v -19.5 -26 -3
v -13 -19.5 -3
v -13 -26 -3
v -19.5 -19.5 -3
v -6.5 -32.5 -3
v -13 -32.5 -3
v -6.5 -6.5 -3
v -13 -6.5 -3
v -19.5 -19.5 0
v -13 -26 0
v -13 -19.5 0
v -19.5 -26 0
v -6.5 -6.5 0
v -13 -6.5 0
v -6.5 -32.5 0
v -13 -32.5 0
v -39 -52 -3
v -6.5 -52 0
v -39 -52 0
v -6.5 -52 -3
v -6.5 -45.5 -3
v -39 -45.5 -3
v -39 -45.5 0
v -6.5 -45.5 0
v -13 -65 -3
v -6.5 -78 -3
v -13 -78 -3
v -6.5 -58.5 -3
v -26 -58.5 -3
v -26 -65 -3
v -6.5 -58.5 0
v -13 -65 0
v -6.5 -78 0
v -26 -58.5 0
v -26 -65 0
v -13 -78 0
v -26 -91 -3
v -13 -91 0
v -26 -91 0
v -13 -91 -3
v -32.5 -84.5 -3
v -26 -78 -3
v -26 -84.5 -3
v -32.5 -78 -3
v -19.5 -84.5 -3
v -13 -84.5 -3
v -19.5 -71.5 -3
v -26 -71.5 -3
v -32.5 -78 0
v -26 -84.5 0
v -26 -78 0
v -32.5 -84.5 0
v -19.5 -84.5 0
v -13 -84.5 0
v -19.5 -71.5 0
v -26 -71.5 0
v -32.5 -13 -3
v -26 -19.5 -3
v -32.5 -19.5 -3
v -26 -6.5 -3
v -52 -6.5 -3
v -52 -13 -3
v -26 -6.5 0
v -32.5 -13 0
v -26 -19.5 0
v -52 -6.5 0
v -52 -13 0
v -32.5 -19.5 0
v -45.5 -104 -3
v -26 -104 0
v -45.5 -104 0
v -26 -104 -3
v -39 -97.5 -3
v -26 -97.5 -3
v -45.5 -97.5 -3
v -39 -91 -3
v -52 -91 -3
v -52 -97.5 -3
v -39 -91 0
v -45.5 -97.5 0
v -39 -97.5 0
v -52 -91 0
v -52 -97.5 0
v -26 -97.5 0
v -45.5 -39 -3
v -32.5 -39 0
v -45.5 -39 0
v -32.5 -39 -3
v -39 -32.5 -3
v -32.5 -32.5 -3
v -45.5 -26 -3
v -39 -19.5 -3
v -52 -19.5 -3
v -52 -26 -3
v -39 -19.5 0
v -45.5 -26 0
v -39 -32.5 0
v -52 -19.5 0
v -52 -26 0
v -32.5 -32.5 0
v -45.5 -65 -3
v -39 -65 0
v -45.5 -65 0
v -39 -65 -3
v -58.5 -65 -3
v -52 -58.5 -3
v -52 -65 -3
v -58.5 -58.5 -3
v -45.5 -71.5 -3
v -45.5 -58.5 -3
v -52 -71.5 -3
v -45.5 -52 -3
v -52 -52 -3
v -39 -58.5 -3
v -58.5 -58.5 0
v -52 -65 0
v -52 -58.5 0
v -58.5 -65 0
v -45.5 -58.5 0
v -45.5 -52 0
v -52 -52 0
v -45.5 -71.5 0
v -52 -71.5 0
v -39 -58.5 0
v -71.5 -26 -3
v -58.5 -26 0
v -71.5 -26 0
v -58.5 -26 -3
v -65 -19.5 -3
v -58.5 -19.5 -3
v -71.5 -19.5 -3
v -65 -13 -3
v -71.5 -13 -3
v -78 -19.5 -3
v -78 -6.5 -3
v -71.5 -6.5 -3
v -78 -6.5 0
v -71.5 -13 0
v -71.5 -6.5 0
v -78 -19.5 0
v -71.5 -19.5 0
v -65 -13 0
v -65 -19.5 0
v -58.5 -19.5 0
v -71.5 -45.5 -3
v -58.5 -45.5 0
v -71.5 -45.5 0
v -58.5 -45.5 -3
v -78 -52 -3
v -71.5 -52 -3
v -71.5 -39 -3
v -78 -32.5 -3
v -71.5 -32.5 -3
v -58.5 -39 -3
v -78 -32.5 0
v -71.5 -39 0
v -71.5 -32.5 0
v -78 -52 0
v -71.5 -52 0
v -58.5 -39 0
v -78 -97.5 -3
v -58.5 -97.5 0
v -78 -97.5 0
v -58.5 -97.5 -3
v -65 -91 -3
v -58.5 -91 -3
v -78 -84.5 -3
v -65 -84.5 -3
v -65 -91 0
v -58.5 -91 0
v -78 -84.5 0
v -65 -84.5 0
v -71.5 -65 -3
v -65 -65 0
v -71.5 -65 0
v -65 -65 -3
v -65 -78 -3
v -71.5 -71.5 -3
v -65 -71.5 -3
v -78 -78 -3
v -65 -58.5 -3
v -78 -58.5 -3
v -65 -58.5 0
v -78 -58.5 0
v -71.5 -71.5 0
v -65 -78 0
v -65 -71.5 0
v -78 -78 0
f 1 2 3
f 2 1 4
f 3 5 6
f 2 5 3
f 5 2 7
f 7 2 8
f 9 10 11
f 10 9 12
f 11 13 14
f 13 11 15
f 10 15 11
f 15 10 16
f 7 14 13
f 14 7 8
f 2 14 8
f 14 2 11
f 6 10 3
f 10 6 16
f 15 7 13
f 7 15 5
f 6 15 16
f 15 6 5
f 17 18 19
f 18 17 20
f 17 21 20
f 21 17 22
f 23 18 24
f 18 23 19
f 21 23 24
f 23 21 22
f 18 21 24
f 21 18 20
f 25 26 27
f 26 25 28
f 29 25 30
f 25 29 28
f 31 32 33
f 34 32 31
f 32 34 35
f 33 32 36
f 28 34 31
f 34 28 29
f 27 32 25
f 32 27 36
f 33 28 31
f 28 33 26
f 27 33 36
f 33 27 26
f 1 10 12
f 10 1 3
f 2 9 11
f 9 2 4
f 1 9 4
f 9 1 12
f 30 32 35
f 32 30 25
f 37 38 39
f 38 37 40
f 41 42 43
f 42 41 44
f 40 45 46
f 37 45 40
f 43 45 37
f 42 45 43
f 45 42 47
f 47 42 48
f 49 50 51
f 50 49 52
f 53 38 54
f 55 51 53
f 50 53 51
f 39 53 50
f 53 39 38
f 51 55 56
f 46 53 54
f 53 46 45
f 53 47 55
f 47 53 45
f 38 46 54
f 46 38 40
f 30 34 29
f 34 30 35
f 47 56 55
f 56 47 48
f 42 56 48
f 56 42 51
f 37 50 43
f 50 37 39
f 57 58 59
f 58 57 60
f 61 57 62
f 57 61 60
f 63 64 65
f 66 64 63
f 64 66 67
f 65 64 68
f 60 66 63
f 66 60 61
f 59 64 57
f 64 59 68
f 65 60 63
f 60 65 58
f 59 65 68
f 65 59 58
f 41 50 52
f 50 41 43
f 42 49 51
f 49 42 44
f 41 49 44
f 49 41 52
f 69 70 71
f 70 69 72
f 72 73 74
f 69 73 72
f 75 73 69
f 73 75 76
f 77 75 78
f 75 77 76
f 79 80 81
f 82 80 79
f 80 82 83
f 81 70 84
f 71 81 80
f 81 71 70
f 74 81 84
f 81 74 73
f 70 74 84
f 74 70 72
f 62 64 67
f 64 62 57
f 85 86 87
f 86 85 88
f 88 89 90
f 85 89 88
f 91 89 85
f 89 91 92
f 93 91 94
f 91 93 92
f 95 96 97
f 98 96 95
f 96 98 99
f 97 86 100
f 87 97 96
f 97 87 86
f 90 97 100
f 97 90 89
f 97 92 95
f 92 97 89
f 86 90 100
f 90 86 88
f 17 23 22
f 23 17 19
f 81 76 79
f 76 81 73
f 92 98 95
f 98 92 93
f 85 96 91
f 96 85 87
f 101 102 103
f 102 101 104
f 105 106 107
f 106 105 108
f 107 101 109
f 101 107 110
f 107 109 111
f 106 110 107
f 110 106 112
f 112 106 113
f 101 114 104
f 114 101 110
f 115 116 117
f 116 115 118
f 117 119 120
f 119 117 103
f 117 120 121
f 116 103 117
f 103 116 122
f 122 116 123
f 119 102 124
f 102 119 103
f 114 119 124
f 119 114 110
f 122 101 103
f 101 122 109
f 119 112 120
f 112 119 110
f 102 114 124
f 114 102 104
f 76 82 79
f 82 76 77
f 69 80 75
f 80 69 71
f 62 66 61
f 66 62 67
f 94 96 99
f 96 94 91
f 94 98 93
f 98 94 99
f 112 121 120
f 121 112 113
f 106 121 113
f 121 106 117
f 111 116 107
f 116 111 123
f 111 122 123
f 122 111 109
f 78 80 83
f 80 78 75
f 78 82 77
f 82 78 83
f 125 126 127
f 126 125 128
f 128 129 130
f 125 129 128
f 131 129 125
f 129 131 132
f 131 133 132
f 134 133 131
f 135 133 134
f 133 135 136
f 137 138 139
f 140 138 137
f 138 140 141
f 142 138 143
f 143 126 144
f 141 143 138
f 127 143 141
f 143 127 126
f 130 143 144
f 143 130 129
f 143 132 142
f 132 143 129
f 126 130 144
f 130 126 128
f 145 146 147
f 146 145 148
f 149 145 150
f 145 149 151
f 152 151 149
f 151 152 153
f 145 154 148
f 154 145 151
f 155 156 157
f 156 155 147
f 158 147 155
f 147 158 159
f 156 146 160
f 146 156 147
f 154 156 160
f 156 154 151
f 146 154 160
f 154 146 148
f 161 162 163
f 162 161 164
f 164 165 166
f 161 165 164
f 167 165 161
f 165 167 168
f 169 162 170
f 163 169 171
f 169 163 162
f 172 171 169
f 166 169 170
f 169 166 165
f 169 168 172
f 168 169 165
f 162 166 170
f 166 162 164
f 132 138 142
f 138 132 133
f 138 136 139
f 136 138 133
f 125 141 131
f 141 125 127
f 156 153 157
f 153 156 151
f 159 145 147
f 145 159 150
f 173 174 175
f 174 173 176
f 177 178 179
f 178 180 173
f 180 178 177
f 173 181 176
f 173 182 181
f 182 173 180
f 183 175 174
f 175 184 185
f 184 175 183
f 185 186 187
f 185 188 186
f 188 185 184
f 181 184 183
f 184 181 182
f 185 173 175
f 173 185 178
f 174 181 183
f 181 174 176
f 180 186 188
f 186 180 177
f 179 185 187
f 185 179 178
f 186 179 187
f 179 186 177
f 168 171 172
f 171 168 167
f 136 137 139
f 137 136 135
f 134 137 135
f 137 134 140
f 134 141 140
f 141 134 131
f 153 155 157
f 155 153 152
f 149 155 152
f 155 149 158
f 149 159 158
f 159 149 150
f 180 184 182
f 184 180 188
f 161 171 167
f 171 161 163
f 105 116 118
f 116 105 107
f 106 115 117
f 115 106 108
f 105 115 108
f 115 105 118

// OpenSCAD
/*
PENTOMINO BLOCKS GENERATOR
==========================
(C) 2017 by Pascal Bauermeister.

(This is a part of the project "Pentomino Belt Buckle", focused on the
Pentomino pieces. It can however be used standalone. The other parts, not in this
file, include: frame, belt clip.)

This OpenSCAD script generates Pentomino blocks, with tabs and cavities to
allow them to hold together.

Being completely parametric allows individual control such as:
- size and thickness,
- tolerances (important for 3D printing), and also
- creating any kind of pieces, including 2D Polyminos of N cells for any N.

This is freeware. Enjoy and modify freely. You may kindly mention this project.
*/

IS_INV = 1;

$fn = 24; // 24: high quality; 8: draft
//$fn = 8;
$fn = 16;

// BASE ETCHING
// this etches the first layer, to compensate for being wider due to being squished down
BASE_HEIGHT = 0.3;
BASE_TOLERANCE = 0.3;

// BLOCK
BLOCK_TOLERANCE = 0.15; // in mm
BLOCK_TOLERANCE = 0.00; // in mm

BLOCK_SIDE = 6.5;       // in mm
BLOCK_HEIGHT = 3;     // in mm

// GRIP
GRIP_TOLERANCE_H = 0.6; // in mm -- horizontal tolerance around grips; 
                        // more means smaller grip
GRIP_TOLERANCE_V = 0.3; // in mm -- vertical tolerance around grips;
                        // affects cavity height
GRIP_RADIUS = BLOCK_SIDE/4 - GRIP_TOLERANCE_H; // in mm
GRIP_HEIGHT = 1;      // in mm
GRIP_RADIUS2 = BLOCK_TOLERANCE;
GRIP_V_OFFSET = IS_INV ? -0.5 : 0.5;

// CAVITY
CAVITY_MARGIN = 0.4; // in mm -- For cavity to not take whole half-side and leave margin on the corner
CAVITY_RADIUS = BLOCK_SIDE/4 - CAVITY_MARGIN; // in mm
CAVITY_HEIGHT = GRIP_HEIGHT + GRIP_TOLERANCE_V; // in mm
CAVITY_RADIUS2 = BLOCK_TOLERANCE;
CAVITY_DISP = BLOCK_TOLERANCE * 2;

CAVITY_RADIUS3 = 0.7;

// MISC
ATOM = 0.0001; // a tiny value just to produce some offsets, making the 
               // results nicer in preview mode by cancelling effects of
               // boolean operations, but meant to not affect the end result
               // noticeably
_ = 0;

///////////////////////////////////////////////////////////////////////////////
// Bitmap defining the Pentomino shapes
GRID = [
    [_, _, _, _, _, _, _, _, _, _, _, _, _, _, _, _, _],
    [_, 1, 1, 1, 1, _, _, 1, _, 1, 1, 1, _, _, _, _, _],
    [_, _, _, 1, _, _, _, 1, _, 1, _, _, _, 1, _, _, _],
    [_, _, _, _, _, _, _, 1, _, 1, _, 1, 1, 1, _, _, _], 
    [_, 1, 1, _, _, _, _, 1, _, _, _, _, 1, _, _, 1, _],
    [_, 1, _, _, _, 1, _, 1, _, _, _, _, _, _, _, 1, _],
    [_, 1, _, 1, 1, 1, _, _, _, 1, _, _, _, _, 1, 1, _],
    [_, 1, _, 1, _, _, _, _, 1, 1, 1, _, _, _, 1, _, _],
    [_, _, _, _, _, _, _, _, _, 1, _, _, _, _, _, _, _],
    [_, _, _, 1, _, _, 1, _, _, _, _, _, _, _, 1, _, _],
    [_, _, 1, 1, _, _, 1, _, _, 1, _, 1, _, 1, 1, _, _],
    [_, 1, 1, _, _, 1, 1, 1, _, 1, 1, 1, _, 1, 1, _, _],
    [_, _, _, _, _, _, _, _, _, _, _, _, _, _, _, _, _],

//    // Chiral copies
//    [_, _, _, _, _, _, _, _, _, _, _, _, _, _, _, _, _],
//    [_, 1, 1, 1, 1, _, 1, _, _, _, 1, 1, 1, 1, _, _, _],
//    [_, _, 1, _, _, _, 1, 1, 1, _, 1, _, _, _, _, _, _],
//    [_, _, _, _, _, _, _, 1, _, _, _, _, _, 1, _, _, _],
//    [_, _, _, 1, 1, _, _, _, _, _, 1, 1, _, 1, 1, 1, _],
//    [_, 1, 1, 1, _, _, _, _, _, 1, 1, 1, _, _, _, 1, _],
    [_, _, _, _, _, _, _, _, _, _, _, _, _, _, _, _, _],
];


GRID_ = [
    [_, _, _, _, _, _, _, _, _, _, _, _, _, _, _, _, _],
    [_, _, _, _, _, _, _, _, _, 1, 1, 1, _, _, _, _, _],
    [_, _, _, _, _, _, _, _, _, 1, _, _, _, 1, _, _, _],
    [_, _, _, _, _, _, _, _, _, 1, _, 1, 1, 1, _, _, _], 
    [_, 1, 1, _, _, _, _, _, _, _, _, _, 1, _, _, 1, _],
    [_, 1, _, _, _, 1, _, _, _, _, _, _, _, _, _, 1, _],
    [_, 1, _, 1, 1, 1, _, _, _, 1, _, _, _, _, 1, 1, _],
    [_, 1, _, 1, _, _, _, _, 1, 1, 1, _, _, _, 1, _, _],
    [_, _, _, _, _, _, _, _, _, 1, _, _, _, _, _, _, _],
    [_, _, _, 1, _, _, 1, _, _, _, _, _, _, _, 1, _, _],
    [_, _, 1, 1, _, _, 1, _, _, 1, _, 1, _, 1, 1, _, _],
    [_, 1, 1, _, _, 1, 1, 1, _, 1, 1, 1, _, 1, 1, _, _],
    [_, _, _, _, _, _, _, _, _, _, _, _, _, _, _, _, _],

];

// Rename as GRID to have a single block, for tests
GRID_ = [
    [_, _, _, _, _, _, _],
    [_, _, _, _, 1, _, _],
    [_, 1, 1, 1, 1, _, _],
    [_, _, _, _, _, _, _],
    [_, _, _, _, _, _, _],
];

///////////////////////////////////////////////////////////////////////////////
// Side-level primitives

/* Generate a grip for one give side (to be added) */
module make_grip_side(x, y, side) {
    convex = (side=="n") ? GRID[y+1][x-1] || GRID[y+1][x+1] :
             (side=="s") ? GRID[y-1][x-1] || GRID[y-1][x+1] :
             (side=="e") ? GRID[y+1][x+1] || GRID[y-1][x+1] :
           /*(side=="w")*/ GRID[y+1][x-1] || GRID[y-1][x-1];
    if (!convex) {
        center = (side=="n") ? [BLOCK_SIDE*.75, BLOCK_SIDE -BLOCK_TOLERANCE*2, 0] :
                 (side=="s") ? [BLOCK_SIDE*.25,             BLOCK_TOLERANCE*2, 0] :
                 (side=="e") ? [BLOCK_SIDE -BLOCK_TOLERANCE*2, BLOCK_SIDE*.25, 0] :
               /*(side=="w")*/ [            BLOCK_TOLERANCE*2, BLOCK_SIDE*.75, 0] ;
        dh = (BLOCK_HEIGHT - GRIP_HEIGHT*2) / 2 - GRIP_V_OFFSET;

        color("yellow")
        translate([0, 0, dh])
        translate(center)
        cylinder(h=GRIP_HEIGHT, r2=GRIP_RADIUS, r1=GRIP_RADIUS2);

        color("yellow")
        translate([0, 0, GRIP_HEIGHT+dh])
        translate(center)
        cylinder(h=GRIP_HEIGHT, r1=GRIP_RADIUS, r2=GRIP_RADIUS2);
    }
}

/* Generate a cavity for one give side (to be substracted) */
module make_cavity_side(x, y, side) {
    // cavity for grip of neighbour piece
    center = (side=="n") ? [BLOCK_SIDE*.25, BLOCK_SIDE -CAVITY_DISP, 0] :
             (side=="s") ? [BLOCK_SIDE*.75,            +CAVITY_DISP, 0] :
             (side=="e") ? [BLOCK_SIDE -CAVITY_DISP, BLOCK_SIDE*.75, 0] :
           /*(side=="w")*/ [           +CAVITY_DISP, BLOCK_SIDE*.25, 0];    
    dh = (BLOCK_HEIGHT - CAVITY_HEIGHT*2) / 2 - GRIP_V_OFFSET;

    color("orange")
    translate([0, 0, dh])
    translate(center)
    cylinder(h=CAVITY_HEIGHT, r2=CAVITY_RADIUS, r1=CAVITY_RADIUS2);

    color("orange")
    translate([0, 0, CAVITY_HEIGHT+dh])
    translate(center)
    cylinder(h=CAVITY_HEIGHT, r1=CAVITY_RADIUS, r2=CAVITY_RADIUS2);

}

/* Generate an etching for one give side (to be substracted) */
module make_etch_side(x, y, side) {
    center = (side=="n") ? [BLOCK_SIDE/2,   BLOCK_SIDE] :
             (side=="s") ? [BLOCK_SIDE/2,            0] :
             (side=="e") ? [  BLOCK_SIDE, BLOCK_SIDE/2] :
           /*(side=="w")*/ [           0, BLOCK_SIDE/2];

    // main etiching
    qsize = (side=="n") ? [BLOCK_SIDE + BLOCK_TOLERANCE*2, BLOCK_TOLERANCE*2] :
            (side=="s") ? [BLOCK_SIDE + BLOCK_TOLERANCE*2, BLOCK_TOLERANCE*2] :
            (side=="e") ? [BLOCK_TOLERANCE*2, BLOCK_SIDE + BLOCK_TOLERANCE*2] :
          /*(side=="w")*/ [BLOCK_TOLERANCE*2, BLOCK_SIDE + BLOCK_TOLERANCE*2];
    tx = center[0] - qsize[0]/2;
    ty = center[1] - qsize[1]/2;

    color("green")
    translate([tx, ty, -ATOM])
    cube([qsize[0], qsize[1], BLOCK_HEIGHT + ATOM*2]);
    
    // base etiching
    qsize2 = (side=="n") ? [BLOCK_SIDE + BLOCK_TOLERANCE*2 + BASE_TOLERANCE*2, BLOCK_TOLERANCE*2 + BASE_TOLERANCE*2] :
             (side=="s") ? [BLOCK_SIDE + BLOCK_TOLERANCE*2 + BASE_TOLERANCE*2, BLOCK_TOLERANCE*2 + BASE_TOLERANCE*2] :
             (side=="e") ? [BLOCK_TOLERANCE*2 + BASE_TOLERANCE*2, BLOCK_SIDE + BLOCK_TOLERANCE*2 + BASE_TOLERANCE*2] :
          /*(side=="w")*/ [BLOCK_TOLERANCE*2 + BASE_TOLERANCE*2, BLOCK_SIDE + BLOCK_TOLERANCE*2 + BASE_TOLERANCE*2];
    tx2 = center[0] - qsize2[0]/2;
    ty2 = center[1] - qsize2[1]/2;
    color("black")
    translate([tx2, ty2, -ATOM])
    cube([qsize2[0], qsize2[1], BASE_HEIGHT + ATOM*2]);    
}

///////////////////////////////////////////////////////////////////////////////
// Block-level primitives

/* Generate a given grid block */
module make_block(x, y) {
    if (GRID[y][x]) {
        translate([x*BLOCK_SIDE, y*BLOCK_SIDE, 0])
        cube([BLOCK_SIDE, BLOCK_SIDE, BLOCK_HEIGHT]);
    }
}

/* Generate etching for a given grid block (to be substracted) */
module make_etch(x, y) {
    if (GRID[y][x]) {
        translate([x*BLOCK_SIDE, y*BLOCK_SIDE, 0]) {
            if (!GRID[y-1][x]) make_etch_side(x, y, "s");
            if (!GRID[y+1][x]) make_etch_side(x, y, "n");
            if (!GRID[y][x+1]) make_etch_side(x, y, "e");
            if (!GRID[y][x-1]) make_etch_side(x, y, "w");
        }
    }
}

/* Generate all grips for a given grid block (to be added) */
module make_grip(x, y) {
    if (GRID[y][x]) {
        translate([x*BLOCK_SIDE, y*BLOCK_SIDE, 0]) {
            if (!GRID[y-1][x]) make_grip_side(x, y, "s");
            if (!GRID[y+1][x]) make_grip_side(x, y, "n");
            if (!GRID[y][x+1]) make_grip_side(x, y, "e");
            if (!GRID[y][x-1]) make_grip_side(x, y, "w");
        }
    }
}

/* Generate all cavities for a given grid block (to be substracted) */
module make_cavity(x, y) {
    if (GRID[y][x]) {
        translate([x*BLOCK_SIDE, y*BLOCK_SIDE, 0]) {
            if (!GRID[y-1][x]) make_cavity_side(x, y, "s");
            if (!GRID[y+1][x]) make_cavity_side(x, y, "n");
            if (!GRID[y][x+1]) make_cavity_side(x, y, "e");
            if (!GRID[y][x-1]) make_cavity_side(x, y, "w");
                
            translate([ 0.5 * BLOCK_SIDE, 0.5 * BLOCK_SIDE, BLOCK_HEIGHT*IS_INV])
            sphere(r=CAVITY_RADIUS3);
        }
    }
}

///////////////////////////////////////////////////////////////////////////////
// Grid-level primitives

/* Generate all blocks of the grid */
module make_blocks() {
    union() { for (y = [0 : len(GRID)-1] ) for (x = [0 : len(GRID[y])-1] ) make_block(x, y); }
}

/* Generate all etchings of the grid */
module make_etches() {
    union() { for (y = [0 : len(GRID)-1] ) for (x = [0 : len(GRID[y])-1] ) make_etch(x, y); }
}

/* Generate all grips of the grid */
module make_grips() {
    union() { for (y = [0 : len(GRID)-1] ) for (x = [0 : len(GRID[y])-1] ) make_grip(x, y); }
}

/* Generate all cavities of the grid */
module make_cavities() {
    union() { for (y = [0 : len(GRID)-1] ) for (x = [0 : len(GRID[y])-1] ) make_cavity(x, y); }
}

///////////////////////////////////////////////////////////////////////////////
// Everything together

/* Generate all objects by combining additive and substractive elements */
module make_all() {
    difference()
    {
        union() {
            //union() {
            difference() {
                make_blocks();
//                make_etches();
            }
//            make_grips();
        }
//        make_cavities();
    }
}

/* Go for it and fix orientation */
rotate([0, 180*1, 90*1]) {
    make_all();
}

// End
